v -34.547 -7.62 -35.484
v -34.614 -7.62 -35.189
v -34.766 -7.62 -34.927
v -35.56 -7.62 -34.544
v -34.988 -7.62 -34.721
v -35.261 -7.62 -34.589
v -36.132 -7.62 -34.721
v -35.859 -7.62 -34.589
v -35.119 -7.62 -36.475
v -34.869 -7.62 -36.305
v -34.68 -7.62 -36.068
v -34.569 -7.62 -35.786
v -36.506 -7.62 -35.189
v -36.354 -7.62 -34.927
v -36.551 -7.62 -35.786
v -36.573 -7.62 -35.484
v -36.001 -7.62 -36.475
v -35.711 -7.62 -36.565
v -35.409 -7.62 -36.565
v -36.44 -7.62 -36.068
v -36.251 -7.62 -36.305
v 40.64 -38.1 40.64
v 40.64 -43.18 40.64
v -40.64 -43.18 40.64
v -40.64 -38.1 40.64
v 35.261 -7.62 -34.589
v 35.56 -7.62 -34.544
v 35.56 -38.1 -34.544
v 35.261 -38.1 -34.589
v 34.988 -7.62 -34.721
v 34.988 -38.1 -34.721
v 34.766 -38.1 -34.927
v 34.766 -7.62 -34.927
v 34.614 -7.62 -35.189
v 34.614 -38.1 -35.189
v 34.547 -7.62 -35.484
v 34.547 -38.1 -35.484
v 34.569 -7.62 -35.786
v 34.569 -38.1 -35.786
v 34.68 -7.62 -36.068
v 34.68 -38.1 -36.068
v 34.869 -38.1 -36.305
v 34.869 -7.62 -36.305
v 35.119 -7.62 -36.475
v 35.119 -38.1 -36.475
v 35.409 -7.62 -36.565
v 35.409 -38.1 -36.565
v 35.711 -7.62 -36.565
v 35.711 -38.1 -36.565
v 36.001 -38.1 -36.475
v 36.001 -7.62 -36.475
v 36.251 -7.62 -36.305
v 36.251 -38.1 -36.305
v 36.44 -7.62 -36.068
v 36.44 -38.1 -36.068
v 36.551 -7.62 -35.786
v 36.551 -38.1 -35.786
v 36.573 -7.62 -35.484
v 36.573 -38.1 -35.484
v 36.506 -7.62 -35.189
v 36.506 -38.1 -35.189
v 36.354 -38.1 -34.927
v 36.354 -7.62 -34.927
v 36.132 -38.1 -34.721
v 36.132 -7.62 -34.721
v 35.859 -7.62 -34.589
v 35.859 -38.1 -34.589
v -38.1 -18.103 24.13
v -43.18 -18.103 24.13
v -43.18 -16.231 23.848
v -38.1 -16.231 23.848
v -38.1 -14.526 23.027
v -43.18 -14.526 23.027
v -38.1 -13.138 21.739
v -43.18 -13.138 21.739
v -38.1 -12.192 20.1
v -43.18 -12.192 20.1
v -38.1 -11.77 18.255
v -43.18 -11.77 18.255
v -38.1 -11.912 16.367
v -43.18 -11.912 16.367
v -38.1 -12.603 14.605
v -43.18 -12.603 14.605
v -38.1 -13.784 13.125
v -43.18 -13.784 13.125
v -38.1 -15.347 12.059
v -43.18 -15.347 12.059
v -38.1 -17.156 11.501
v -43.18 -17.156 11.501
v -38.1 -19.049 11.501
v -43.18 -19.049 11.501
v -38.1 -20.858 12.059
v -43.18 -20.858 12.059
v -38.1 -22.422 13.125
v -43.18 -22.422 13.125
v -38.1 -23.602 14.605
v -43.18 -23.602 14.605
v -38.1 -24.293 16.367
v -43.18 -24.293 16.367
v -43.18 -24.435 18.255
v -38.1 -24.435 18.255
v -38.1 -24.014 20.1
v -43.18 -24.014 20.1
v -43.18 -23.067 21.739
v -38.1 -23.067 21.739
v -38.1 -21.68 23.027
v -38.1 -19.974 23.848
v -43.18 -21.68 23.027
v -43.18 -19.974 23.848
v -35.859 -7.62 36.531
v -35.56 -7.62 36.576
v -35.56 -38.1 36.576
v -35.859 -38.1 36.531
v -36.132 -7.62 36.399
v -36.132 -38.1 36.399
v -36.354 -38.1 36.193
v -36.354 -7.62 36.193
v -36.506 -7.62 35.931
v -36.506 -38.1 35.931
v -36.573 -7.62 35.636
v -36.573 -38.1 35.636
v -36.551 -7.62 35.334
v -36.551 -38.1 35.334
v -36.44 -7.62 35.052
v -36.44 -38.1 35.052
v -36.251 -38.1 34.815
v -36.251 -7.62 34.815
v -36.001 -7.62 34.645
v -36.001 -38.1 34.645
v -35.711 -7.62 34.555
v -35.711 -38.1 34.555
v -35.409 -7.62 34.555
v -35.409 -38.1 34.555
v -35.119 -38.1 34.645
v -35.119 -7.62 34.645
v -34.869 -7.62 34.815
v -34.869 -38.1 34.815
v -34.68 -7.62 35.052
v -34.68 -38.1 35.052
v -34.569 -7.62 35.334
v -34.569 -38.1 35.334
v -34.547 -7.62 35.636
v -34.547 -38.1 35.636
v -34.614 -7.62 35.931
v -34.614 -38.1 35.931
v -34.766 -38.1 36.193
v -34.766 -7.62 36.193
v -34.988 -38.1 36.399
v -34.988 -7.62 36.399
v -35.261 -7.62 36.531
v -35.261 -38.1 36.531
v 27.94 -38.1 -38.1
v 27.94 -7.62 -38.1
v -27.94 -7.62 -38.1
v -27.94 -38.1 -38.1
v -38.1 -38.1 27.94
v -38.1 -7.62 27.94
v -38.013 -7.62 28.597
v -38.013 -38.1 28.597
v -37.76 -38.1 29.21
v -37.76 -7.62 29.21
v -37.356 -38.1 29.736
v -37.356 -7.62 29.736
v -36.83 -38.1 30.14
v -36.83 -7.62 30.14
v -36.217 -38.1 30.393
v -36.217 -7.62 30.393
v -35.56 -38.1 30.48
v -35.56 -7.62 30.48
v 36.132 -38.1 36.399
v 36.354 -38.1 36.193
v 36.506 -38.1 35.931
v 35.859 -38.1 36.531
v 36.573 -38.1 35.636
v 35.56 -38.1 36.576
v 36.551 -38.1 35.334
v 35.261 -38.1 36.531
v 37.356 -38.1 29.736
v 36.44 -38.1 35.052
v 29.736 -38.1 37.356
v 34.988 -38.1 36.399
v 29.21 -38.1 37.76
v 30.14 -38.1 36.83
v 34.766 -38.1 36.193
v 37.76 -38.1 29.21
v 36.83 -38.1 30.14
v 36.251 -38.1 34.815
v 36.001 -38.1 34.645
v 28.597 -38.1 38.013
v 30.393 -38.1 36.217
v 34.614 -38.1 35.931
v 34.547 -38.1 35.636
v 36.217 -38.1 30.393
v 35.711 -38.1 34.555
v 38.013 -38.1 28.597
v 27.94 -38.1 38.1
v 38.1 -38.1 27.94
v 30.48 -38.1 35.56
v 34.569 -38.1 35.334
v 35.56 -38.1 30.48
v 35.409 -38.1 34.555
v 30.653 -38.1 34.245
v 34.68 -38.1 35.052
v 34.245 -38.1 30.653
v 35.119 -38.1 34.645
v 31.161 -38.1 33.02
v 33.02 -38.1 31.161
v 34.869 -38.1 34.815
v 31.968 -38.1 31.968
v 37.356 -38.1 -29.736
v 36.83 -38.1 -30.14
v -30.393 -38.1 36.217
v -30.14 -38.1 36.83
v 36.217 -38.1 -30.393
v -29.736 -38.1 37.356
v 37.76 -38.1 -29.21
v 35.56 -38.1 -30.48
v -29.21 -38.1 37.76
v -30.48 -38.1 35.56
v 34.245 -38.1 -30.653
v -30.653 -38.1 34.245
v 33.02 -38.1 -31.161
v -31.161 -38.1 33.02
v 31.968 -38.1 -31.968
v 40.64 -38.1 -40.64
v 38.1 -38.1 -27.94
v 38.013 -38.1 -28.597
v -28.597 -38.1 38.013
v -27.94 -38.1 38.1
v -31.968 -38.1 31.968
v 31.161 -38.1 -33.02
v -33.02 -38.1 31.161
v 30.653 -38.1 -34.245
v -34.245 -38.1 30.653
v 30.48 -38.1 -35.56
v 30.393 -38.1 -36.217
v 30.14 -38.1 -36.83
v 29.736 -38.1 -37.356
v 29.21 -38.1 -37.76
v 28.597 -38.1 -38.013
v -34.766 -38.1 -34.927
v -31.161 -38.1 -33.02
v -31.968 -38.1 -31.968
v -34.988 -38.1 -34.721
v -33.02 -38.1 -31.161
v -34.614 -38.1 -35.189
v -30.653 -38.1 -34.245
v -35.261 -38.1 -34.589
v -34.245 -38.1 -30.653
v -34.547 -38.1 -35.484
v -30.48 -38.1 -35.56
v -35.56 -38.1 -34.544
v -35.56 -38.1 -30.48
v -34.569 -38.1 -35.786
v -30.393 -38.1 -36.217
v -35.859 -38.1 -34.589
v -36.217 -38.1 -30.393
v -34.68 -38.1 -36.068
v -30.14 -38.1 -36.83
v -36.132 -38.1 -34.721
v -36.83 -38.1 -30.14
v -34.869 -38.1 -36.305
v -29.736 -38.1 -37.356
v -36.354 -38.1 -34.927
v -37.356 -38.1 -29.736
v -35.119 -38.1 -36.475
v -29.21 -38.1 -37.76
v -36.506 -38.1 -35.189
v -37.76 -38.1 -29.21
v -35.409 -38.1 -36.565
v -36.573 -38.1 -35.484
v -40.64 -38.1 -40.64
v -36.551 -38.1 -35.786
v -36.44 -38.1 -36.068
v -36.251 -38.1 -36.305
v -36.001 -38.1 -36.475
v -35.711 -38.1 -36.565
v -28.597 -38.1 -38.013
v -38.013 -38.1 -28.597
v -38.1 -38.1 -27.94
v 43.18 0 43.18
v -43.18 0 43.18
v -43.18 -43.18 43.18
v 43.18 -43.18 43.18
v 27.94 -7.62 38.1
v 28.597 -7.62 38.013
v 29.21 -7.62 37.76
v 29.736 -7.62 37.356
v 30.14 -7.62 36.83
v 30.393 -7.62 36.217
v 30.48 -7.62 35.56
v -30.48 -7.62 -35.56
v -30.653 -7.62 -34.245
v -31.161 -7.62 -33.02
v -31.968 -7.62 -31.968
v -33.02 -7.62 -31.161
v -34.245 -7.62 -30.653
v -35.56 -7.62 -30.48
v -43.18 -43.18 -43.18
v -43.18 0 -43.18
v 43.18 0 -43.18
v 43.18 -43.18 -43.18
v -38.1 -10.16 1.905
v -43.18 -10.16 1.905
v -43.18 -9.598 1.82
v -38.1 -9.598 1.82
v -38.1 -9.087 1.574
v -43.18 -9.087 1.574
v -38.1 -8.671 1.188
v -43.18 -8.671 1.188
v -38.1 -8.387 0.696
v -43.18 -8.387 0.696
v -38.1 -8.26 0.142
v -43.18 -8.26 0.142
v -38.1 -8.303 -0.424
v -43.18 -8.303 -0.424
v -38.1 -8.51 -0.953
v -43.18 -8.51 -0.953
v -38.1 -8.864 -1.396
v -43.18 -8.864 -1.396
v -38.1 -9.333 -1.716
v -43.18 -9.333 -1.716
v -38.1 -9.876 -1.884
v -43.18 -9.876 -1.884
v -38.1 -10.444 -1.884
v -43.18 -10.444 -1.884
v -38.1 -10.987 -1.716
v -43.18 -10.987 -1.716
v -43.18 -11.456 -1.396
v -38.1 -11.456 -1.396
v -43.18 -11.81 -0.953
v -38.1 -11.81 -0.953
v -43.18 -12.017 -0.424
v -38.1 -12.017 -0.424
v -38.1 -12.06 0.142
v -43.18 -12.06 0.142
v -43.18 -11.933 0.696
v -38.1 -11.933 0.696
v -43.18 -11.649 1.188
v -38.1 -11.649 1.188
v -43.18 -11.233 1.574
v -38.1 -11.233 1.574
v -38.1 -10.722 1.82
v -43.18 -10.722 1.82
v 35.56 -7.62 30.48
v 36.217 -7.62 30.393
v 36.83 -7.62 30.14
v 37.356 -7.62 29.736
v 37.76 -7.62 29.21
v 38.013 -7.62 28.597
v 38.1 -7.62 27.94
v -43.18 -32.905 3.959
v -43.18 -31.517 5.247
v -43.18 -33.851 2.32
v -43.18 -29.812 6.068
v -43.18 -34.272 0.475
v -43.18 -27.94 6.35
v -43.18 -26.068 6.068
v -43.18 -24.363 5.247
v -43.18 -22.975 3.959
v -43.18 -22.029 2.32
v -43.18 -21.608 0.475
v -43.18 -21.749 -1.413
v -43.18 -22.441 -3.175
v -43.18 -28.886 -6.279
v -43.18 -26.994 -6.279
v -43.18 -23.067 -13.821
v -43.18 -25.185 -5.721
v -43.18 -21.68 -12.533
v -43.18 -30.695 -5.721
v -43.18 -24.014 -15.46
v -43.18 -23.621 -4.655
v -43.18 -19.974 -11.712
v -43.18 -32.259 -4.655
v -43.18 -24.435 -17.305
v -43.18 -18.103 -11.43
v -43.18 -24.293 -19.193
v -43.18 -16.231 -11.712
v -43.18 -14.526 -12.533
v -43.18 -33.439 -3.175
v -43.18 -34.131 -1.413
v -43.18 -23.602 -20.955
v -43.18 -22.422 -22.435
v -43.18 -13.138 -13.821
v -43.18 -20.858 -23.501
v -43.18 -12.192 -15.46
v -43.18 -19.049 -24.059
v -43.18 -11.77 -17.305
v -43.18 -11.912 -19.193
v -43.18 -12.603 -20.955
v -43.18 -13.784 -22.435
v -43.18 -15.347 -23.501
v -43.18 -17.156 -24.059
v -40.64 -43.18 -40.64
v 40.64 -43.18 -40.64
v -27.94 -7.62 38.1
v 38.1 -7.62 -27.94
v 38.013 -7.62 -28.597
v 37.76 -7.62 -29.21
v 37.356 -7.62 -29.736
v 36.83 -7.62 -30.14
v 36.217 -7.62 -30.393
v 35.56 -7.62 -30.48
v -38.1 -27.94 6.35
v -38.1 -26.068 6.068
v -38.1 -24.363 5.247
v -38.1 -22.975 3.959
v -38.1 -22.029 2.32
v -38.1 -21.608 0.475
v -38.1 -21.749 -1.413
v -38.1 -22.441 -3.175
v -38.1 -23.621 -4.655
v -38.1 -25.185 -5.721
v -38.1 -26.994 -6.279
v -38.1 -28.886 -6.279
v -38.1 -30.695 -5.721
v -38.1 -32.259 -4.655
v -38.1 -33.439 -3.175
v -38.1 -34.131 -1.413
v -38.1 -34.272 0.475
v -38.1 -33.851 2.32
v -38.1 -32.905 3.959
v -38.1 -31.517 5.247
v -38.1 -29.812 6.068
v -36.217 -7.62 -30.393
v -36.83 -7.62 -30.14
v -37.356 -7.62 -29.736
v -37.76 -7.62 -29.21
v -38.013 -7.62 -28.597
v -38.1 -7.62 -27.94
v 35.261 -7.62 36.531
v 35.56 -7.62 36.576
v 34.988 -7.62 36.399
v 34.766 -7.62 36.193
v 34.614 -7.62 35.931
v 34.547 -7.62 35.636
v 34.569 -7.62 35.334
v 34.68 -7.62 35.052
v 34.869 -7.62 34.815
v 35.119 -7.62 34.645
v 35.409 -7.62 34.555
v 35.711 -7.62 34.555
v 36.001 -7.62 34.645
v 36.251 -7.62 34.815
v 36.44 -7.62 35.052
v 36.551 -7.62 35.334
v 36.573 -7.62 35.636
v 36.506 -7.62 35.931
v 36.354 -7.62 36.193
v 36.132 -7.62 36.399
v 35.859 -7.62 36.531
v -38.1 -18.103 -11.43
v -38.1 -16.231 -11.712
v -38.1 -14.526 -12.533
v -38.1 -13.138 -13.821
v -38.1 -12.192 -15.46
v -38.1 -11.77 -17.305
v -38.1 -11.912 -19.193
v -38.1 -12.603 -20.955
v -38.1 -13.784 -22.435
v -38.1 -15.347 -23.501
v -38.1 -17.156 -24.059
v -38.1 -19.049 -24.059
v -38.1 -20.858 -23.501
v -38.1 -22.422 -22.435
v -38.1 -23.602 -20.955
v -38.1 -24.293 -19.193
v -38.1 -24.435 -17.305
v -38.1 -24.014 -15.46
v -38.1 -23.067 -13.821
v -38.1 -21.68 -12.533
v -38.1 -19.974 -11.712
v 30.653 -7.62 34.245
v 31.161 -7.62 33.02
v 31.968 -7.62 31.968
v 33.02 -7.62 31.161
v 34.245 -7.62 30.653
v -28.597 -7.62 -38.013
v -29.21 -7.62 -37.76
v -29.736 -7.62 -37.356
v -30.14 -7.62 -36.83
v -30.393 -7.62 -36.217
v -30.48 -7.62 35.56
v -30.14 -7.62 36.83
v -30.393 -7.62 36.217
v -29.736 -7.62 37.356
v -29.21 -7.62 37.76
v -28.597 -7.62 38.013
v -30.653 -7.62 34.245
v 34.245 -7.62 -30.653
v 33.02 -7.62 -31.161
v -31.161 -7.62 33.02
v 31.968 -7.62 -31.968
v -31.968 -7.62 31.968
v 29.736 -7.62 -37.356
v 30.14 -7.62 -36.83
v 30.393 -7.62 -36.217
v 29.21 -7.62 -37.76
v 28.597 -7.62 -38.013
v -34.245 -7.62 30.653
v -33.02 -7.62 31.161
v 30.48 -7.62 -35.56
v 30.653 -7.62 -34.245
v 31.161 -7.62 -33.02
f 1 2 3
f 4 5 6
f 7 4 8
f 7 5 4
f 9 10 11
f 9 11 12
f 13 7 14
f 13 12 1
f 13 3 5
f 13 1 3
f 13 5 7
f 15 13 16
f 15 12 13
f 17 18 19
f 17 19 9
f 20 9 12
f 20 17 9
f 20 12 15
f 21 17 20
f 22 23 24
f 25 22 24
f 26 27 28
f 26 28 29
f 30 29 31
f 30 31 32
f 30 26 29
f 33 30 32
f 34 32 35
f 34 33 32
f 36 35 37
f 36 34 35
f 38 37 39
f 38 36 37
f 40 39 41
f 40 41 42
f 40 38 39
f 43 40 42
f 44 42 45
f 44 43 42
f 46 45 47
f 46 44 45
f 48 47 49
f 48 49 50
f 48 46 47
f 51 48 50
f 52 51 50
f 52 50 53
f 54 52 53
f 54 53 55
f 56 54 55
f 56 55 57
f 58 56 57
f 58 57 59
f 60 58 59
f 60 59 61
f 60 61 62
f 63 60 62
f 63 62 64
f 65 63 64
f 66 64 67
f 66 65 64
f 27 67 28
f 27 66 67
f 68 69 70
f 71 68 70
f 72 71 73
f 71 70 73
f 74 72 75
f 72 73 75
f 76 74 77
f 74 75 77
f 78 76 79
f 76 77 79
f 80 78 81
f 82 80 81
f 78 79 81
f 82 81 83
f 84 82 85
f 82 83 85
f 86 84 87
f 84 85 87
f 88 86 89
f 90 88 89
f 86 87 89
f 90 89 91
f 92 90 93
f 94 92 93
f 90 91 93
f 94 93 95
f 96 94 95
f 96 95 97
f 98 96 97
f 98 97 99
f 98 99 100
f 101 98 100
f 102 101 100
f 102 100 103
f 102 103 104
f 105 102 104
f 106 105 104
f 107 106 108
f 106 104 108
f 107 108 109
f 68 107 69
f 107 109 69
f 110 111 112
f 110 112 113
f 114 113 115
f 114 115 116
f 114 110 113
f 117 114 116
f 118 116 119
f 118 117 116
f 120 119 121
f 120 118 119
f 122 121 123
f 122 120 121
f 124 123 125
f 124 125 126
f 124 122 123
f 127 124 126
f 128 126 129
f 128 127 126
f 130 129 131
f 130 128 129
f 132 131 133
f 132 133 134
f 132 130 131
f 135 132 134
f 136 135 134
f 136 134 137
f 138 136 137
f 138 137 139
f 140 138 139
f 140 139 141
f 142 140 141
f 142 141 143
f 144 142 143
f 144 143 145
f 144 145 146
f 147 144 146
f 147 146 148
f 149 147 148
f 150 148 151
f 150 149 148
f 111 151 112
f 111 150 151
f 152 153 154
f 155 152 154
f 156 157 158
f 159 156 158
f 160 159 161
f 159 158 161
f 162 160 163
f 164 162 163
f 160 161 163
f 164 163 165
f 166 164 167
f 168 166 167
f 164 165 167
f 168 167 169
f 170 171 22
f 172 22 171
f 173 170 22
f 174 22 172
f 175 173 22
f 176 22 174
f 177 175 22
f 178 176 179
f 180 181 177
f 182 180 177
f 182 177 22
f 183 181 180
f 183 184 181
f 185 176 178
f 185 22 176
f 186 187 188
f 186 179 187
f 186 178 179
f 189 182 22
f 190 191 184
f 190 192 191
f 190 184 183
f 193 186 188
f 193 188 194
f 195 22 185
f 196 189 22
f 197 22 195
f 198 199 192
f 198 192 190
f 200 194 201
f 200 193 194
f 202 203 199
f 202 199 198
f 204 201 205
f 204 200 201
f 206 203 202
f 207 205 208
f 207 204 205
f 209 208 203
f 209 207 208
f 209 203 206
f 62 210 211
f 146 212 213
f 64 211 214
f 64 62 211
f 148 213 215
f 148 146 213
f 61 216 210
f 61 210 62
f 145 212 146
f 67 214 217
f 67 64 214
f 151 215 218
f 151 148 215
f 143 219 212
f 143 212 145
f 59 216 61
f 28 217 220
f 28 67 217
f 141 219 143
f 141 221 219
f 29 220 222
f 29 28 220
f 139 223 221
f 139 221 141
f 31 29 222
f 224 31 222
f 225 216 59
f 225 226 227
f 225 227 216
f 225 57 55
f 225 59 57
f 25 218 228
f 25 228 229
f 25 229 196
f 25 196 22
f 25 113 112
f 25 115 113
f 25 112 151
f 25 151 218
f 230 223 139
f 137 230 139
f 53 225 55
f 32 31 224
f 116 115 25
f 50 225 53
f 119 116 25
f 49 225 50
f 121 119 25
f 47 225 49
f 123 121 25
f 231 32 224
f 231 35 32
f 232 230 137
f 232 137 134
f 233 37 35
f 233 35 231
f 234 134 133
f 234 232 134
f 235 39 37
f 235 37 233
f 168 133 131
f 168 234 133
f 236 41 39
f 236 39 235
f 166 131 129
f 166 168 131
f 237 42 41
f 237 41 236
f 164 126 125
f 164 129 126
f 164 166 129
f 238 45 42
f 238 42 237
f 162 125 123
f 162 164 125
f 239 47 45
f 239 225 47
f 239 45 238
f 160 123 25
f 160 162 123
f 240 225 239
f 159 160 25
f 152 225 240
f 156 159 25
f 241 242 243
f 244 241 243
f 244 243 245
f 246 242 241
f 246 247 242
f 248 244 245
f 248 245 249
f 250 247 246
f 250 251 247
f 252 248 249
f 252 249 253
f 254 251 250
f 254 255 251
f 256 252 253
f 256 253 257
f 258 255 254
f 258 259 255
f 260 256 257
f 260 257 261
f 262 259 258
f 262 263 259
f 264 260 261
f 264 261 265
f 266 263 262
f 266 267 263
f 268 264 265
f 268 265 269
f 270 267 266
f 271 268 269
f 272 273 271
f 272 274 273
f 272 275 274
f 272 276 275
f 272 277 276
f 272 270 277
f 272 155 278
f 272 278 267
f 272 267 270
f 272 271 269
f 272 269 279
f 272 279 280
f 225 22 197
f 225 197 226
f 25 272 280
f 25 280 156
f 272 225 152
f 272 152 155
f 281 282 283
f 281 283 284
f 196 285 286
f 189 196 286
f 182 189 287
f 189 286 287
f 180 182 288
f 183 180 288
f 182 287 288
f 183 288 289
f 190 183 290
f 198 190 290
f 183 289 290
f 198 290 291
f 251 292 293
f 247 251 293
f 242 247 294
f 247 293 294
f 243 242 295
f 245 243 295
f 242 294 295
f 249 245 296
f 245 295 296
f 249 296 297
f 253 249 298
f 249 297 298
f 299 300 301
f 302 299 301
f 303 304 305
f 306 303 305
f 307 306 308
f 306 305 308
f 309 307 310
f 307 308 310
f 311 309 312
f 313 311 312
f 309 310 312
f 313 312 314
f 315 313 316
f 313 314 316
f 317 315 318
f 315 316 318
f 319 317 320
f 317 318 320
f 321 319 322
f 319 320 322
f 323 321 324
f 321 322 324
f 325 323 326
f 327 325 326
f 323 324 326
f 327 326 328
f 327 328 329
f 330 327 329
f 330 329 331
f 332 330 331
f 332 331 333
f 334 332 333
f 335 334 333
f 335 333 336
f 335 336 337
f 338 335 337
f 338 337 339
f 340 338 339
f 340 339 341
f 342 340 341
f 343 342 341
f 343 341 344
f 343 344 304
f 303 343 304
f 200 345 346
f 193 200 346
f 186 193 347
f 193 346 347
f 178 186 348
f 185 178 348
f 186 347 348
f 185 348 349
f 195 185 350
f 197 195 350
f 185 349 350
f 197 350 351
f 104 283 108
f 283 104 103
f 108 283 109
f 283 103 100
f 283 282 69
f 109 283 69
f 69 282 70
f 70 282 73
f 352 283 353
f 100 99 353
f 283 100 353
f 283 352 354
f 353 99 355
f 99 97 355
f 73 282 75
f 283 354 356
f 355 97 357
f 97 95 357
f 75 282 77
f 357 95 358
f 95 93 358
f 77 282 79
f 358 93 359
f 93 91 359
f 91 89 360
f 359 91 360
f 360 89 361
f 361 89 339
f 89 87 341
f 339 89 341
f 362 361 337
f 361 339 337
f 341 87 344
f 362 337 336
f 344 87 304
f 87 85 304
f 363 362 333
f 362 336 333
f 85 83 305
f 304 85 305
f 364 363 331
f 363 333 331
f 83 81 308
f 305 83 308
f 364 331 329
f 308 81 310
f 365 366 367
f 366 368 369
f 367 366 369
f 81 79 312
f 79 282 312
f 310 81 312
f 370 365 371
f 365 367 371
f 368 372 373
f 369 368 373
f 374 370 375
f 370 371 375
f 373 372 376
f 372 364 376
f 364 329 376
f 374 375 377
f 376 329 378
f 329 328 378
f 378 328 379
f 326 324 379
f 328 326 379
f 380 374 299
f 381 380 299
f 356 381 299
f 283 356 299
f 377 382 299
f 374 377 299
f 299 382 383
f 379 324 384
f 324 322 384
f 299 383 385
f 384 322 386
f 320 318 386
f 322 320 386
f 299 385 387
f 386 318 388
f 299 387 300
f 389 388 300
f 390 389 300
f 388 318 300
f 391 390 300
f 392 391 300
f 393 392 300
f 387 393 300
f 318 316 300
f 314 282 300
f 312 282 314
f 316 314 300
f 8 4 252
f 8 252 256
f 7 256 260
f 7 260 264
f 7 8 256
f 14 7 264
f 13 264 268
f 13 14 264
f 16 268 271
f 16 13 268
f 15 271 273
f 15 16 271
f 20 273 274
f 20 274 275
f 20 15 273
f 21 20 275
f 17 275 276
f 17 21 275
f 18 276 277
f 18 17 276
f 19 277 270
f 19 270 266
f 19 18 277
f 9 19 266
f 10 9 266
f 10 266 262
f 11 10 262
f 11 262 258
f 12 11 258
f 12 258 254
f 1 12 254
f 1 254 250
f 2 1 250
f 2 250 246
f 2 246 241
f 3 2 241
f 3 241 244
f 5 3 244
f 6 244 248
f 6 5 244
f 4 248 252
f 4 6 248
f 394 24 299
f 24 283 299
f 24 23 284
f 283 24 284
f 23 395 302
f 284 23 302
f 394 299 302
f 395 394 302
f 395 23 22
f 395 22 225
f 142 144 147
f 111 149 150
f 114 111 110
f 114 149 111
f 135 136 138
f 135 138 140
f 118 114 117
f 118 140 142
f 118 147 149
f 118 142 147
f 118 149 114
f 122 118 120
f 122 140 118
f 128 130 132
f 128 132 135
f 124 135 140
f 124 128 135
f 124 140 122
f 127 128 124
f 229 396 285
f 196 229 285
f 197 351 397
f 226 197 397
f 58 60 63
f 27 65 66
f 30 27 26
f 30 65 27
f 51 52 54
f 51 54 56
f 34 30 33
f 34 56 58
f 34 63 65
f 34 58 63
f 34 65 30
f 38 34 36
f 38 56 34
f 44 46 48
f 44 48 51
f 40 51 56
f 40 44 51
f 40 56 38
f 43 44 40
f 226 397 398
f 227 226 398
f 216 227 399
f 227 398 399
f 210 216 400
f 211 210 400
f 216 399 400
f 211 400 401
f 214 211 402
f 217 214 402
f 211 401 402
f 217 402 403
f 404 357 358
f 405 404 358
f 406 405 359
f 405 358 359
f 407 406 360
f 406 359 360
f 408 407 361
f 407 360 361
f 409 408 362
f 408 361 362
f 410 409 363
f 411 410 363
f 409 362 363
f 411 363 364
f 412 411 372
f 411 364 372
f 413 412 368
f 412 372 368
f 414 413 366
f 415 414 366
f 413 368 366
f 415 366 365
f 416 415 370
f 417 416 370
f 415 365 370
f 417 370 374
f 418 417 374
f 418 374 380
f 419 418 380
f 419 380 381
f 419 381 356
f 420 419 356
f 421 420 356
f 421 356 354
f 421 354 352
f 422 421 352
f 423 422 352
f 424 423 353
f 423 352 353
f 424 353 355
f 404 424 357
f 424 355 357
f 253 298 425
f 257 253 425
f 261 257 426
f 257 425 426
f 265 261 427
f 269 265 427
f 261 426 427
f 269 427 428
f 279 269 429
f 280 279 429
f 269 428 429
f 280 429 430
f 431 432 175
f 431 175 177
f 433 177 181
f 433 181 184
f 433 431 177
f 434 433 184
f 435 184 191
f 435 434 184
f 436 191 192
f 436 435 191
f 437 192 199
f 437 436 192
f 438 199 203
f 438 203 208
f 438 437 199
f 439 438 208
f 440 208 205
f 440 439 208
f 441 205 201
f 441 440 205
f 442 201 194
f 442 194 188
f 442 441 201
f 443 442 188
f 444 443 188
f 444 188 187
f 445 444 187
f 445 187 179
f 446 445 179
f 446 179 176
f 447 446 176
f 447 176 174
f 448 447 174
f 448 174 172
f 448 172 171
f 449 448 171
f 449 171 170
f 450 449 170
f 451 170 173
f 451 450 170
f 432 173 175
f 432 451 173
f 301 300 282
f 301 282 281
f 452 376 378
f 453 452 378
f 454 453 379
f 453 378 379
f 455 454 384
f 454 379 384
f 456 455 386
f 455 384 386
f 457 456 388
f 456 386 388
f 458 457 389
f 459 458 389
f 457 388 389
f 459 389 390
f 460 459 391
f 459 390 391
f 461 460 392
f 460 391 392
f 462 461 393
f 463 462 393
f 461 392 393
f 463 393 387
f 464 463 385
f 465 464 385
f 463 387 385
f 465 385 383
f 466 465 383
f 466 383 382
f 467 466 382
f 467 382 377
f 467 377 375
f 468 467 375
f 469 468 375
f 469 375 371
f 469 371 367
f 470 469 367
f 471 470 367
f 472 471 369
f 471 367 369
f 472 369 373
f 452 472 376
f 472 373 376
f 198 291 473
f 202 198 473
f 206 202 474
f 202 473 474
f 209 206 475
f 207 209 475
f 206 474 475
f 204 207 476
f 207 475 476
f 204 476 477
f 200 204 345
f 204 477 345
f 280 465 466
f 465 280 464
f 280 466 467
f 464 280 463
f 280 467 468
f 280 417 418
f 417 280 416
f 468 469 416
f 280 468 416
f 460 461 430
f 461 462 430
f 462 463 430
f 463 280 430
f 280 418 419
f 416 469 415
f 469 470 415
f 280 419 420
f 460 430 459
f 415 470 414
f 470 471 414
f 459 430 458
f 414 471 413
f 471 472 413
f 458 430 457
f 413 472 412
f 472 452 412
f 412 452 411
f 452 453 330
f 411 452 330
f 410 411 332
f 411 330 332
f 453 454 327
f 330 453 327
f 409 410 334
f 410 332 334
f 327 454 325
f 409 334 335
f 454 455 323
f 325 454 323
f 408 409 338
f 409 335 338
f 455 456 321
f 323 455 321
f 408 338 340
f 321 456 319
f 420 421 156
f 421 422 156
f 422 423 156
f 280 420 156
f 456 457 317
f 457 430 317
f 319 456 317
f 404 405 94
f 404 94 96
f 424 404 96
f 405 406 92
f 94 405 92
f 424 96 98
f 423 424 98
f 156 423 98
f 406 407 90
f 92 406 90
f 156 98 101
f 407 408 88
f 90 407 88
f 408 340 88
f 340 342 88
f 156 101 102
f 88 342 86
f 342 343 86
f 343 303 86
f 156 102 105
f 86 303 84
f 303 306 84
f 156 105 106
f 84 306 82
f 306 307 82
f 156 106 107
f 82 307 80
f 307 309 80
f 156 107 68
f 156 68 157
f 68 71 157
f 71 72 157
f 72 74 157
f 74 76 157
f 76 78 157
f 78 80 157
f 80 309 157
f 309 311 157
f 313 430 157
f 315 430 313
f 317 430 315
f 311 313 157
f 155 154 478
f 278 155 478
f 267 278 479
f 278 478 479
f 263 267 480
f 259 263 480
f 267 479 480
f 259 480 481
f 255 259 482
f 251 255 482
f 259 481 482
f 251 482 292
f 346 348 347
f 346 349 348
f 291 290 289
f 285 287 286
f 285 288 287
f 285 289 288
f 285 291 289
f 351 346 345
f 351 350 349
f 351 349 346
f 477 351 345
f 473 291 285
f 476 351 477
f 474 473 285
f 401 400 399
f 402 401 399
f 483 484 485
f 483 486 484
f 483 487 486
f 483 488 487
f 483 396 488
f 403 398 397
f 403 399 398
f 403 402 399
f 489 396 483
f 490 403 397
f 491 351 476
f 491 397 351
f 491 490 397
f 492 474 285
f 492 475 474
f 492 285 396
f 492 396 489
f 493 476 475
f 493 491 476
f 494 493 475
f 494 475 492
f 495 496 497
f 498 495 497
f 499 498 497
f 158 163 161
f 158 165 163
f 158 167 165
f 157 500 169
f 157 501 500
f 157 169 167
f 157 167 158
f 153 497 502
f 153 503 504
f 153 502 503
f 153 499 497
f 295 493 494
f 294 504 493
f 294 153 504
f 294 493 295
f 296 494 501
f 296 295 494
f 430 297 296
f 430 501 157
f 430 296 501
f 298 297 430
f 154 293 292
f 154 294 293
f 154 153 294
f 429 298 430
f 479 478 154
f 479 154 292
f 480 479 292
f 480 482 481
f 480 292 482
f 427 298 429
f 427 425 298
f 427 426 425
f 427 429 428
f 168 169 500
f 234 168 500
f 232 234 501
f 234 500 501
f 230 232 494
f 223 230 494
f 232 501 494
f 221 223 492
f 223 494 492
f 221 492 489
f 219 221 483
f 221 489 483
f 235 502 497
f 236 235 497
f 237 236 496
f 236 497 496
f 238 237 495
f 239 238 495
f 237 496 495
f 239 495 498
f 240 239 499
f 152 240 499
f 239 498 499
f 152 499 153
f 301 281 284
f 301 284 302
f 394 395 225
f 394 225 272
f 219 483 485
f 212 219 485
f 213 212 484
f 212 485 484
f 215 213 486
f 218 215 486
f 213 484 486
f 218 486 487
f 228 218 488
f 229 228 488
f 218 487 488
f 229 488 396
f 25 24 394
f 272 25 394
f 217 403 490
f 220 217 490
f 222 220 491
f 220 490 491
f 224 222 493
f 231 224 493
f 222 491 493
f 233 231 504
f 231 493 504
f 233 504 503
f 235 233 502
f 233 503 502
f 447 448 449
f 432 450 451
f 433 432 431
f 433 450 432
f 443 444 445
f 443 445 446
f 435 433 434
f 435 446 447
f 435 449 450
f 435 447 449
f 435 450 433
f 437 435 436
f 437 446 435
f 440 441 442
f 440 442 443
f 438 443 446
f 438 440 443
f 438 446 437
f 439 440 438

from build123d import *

# Parameters (mm, degrees)
SKETCH1_W           = 86.36
SKETCH1_H           = 86.36
BOSS_EXTRUDE1_DEPTH = 43.18
SKETCH2_W           = 81.28
SKETCH2_H           = 81.28
CUT_EXTRUDE2_DEPTH  = 35.56
SKETCH6_W           = 81.28
SKETCH6_H           = 81.28
SKETCH6_R           = 1.016
BOSS_EXTRUDE2_DEPTH = 30.48
SKETCH9_R           = 6.35
CUT_EXTRUDE3_DEPTH  = 5.08
CUT_EXTRUDE4_REACH  = 107.769
SKETCH10_R          = 1.905


with BuildPart() as part:
    # Sketch1 → Boss-Extrude1 (new body)
    with BuildSketch(Plane(origin=(0, 0, 0), x_dir=(1, 0, 0), z_dir=(0, 1, 0))):
        Rectangle(SKETCH1_W, SKETCH1_H)
    extrude(amount=-BOSS_EXTRUDE1_DEPTH)

    # Sketch2 → Cut-Extrude2 (cut)
    with BuildSketch(Plane(origin=(0, -43.18, 0), x_dir=(-1, 0, 0), z_dir=(0, -1, 0))):
        Rectangle(SKETCH2_W, SKETCH2_H)
    extrude(amount=-CUT_EXTRUDE2_DEPTH, mode=Mode.SUBTRACT)

    # Sketch6 → Boss-Extrude2 (add)
    with BuildSketch(Plane(origin=(0, -7.62, 0), x_dir=(-1, 0, 0), z_dir=(0, -1, 0))):
        Rectangle(SKETCH6_W, SKETCH6_H)
        with Locations(Location((-35.56, 35.56, 0), (0, 0, 270))):
            Circle(SKETCH6_R, mode=Mode.SUBTRACT)
        with Locations(Location((35.56, 35.56, 0), (0, 0, 270))):
            Circle(SKETCH6_R, mode=Mode.SUBTRACT)
        with Locations(Location((35.56, -35.56, 0), (0, 0, 270))):
            Circle(SKETCH6_R, mode=Mode.SUBTRACT)
        with Locations(Location((-35.56, -35.56, 0), (0, 0, 270))):
            Circle(SKETCH6_R, mode=Mode.SUBTRACT)
        with BuildLine():
            Line((-27.94, 38.1), (27.94, 38.1))
            ThreePointArc((27.94, 38.1), (29.736051224, 37.356051224), (30.48, 35.56))
            ThreePointArc((30.48, 35.56), (31.967897552, 31.967897552), (35.56, 30.48))
            ThreePointArc((35.56, 30.48), (37.356051224, 29.736051224), (38.1, 27.94))
            Line((38.1, 27.94), (38.1, -27.94))
            ThreePointArc((38.1, -27.94), (37.356051224, -29.736051224), (35.56, -30.48))
            ThreePointArc((35.56, -30.48), (31.967897552, -31.967897552), (30.48, -35.56))
            ThreePointArc((30.48, -35.56), (29.736051224, -37.356051224), (27.94, -38.1))
            Line((27.94, -38.1), (-27.94, -38.1))
            ThreePointArc((-27.94, -38.1), (-29.736051224, -37.356051224), (-30.48, -35.56))
            ThreePointArc((-30.48, -35.56), (-31.967897552, -31.967897552), (-35.56, -30.48))
            ThreePointArc((-35.56, -30.48), (-37.356051224, -29.736051224), (-38.1, -27.94))
            Line((-38.1, -27.94), (-38.1, 27.94))
            ThreePointArc((-38.1, 27.94), (-37.356051224, 29.736051224), (-35.56, 30.48))
            ThreePointArc((-35.56, 30.48), (-31.967897552, 31.967897552), (-30.48, 35.56))
            ThreePointArc((-30.48, 35.56), (-29.736051224, 37.356051224), (-27.94, 38.1))
        make_face(mode=Mode.SUBTRACT)
    extrude(amount=BOSS_EXTRUDE2_DEPTH)

    # Sketch9 → Cut-Extrude3 (cut)
    with BuildSketch(Plane.ZY.offset(43.18)):
        with Locations((0, -27.94)):
            Circle(SKETCH9_R)
        with Locations((-17.78, -18.102622301)):
            Circle(SKETCH9_R)
        with Locations((17.78, -18.102622301)):
            Circle(SKETCH9_R)
    extrude(amount=-CUT_EXTRUDE3_DEPTH, mode=Mode.SUBTRACT)

    # Sketch10 → Cut-Extrude4 (cut, up to next)
    with BuildSketch(Plane.ZY.offset(43.18), mode=Mode.PRIVATE) as cut_extrude4_sk1:
        with Locations((0, -10.16)):
            Circle(SKETCH10_R)
    cut_extrude4_tool1 = extrude(cut_extrude4_sk1.sketch, amount=-CUT_EXTRUDE4_REACH, mode=Mode.PRIVATE) & part.part
    add(cut_extrude4_tool1.solids().sort_by_distance((-43.18, -10.16, 0))[0], mode=Mode.SUBTRACT)


solid = part.part
